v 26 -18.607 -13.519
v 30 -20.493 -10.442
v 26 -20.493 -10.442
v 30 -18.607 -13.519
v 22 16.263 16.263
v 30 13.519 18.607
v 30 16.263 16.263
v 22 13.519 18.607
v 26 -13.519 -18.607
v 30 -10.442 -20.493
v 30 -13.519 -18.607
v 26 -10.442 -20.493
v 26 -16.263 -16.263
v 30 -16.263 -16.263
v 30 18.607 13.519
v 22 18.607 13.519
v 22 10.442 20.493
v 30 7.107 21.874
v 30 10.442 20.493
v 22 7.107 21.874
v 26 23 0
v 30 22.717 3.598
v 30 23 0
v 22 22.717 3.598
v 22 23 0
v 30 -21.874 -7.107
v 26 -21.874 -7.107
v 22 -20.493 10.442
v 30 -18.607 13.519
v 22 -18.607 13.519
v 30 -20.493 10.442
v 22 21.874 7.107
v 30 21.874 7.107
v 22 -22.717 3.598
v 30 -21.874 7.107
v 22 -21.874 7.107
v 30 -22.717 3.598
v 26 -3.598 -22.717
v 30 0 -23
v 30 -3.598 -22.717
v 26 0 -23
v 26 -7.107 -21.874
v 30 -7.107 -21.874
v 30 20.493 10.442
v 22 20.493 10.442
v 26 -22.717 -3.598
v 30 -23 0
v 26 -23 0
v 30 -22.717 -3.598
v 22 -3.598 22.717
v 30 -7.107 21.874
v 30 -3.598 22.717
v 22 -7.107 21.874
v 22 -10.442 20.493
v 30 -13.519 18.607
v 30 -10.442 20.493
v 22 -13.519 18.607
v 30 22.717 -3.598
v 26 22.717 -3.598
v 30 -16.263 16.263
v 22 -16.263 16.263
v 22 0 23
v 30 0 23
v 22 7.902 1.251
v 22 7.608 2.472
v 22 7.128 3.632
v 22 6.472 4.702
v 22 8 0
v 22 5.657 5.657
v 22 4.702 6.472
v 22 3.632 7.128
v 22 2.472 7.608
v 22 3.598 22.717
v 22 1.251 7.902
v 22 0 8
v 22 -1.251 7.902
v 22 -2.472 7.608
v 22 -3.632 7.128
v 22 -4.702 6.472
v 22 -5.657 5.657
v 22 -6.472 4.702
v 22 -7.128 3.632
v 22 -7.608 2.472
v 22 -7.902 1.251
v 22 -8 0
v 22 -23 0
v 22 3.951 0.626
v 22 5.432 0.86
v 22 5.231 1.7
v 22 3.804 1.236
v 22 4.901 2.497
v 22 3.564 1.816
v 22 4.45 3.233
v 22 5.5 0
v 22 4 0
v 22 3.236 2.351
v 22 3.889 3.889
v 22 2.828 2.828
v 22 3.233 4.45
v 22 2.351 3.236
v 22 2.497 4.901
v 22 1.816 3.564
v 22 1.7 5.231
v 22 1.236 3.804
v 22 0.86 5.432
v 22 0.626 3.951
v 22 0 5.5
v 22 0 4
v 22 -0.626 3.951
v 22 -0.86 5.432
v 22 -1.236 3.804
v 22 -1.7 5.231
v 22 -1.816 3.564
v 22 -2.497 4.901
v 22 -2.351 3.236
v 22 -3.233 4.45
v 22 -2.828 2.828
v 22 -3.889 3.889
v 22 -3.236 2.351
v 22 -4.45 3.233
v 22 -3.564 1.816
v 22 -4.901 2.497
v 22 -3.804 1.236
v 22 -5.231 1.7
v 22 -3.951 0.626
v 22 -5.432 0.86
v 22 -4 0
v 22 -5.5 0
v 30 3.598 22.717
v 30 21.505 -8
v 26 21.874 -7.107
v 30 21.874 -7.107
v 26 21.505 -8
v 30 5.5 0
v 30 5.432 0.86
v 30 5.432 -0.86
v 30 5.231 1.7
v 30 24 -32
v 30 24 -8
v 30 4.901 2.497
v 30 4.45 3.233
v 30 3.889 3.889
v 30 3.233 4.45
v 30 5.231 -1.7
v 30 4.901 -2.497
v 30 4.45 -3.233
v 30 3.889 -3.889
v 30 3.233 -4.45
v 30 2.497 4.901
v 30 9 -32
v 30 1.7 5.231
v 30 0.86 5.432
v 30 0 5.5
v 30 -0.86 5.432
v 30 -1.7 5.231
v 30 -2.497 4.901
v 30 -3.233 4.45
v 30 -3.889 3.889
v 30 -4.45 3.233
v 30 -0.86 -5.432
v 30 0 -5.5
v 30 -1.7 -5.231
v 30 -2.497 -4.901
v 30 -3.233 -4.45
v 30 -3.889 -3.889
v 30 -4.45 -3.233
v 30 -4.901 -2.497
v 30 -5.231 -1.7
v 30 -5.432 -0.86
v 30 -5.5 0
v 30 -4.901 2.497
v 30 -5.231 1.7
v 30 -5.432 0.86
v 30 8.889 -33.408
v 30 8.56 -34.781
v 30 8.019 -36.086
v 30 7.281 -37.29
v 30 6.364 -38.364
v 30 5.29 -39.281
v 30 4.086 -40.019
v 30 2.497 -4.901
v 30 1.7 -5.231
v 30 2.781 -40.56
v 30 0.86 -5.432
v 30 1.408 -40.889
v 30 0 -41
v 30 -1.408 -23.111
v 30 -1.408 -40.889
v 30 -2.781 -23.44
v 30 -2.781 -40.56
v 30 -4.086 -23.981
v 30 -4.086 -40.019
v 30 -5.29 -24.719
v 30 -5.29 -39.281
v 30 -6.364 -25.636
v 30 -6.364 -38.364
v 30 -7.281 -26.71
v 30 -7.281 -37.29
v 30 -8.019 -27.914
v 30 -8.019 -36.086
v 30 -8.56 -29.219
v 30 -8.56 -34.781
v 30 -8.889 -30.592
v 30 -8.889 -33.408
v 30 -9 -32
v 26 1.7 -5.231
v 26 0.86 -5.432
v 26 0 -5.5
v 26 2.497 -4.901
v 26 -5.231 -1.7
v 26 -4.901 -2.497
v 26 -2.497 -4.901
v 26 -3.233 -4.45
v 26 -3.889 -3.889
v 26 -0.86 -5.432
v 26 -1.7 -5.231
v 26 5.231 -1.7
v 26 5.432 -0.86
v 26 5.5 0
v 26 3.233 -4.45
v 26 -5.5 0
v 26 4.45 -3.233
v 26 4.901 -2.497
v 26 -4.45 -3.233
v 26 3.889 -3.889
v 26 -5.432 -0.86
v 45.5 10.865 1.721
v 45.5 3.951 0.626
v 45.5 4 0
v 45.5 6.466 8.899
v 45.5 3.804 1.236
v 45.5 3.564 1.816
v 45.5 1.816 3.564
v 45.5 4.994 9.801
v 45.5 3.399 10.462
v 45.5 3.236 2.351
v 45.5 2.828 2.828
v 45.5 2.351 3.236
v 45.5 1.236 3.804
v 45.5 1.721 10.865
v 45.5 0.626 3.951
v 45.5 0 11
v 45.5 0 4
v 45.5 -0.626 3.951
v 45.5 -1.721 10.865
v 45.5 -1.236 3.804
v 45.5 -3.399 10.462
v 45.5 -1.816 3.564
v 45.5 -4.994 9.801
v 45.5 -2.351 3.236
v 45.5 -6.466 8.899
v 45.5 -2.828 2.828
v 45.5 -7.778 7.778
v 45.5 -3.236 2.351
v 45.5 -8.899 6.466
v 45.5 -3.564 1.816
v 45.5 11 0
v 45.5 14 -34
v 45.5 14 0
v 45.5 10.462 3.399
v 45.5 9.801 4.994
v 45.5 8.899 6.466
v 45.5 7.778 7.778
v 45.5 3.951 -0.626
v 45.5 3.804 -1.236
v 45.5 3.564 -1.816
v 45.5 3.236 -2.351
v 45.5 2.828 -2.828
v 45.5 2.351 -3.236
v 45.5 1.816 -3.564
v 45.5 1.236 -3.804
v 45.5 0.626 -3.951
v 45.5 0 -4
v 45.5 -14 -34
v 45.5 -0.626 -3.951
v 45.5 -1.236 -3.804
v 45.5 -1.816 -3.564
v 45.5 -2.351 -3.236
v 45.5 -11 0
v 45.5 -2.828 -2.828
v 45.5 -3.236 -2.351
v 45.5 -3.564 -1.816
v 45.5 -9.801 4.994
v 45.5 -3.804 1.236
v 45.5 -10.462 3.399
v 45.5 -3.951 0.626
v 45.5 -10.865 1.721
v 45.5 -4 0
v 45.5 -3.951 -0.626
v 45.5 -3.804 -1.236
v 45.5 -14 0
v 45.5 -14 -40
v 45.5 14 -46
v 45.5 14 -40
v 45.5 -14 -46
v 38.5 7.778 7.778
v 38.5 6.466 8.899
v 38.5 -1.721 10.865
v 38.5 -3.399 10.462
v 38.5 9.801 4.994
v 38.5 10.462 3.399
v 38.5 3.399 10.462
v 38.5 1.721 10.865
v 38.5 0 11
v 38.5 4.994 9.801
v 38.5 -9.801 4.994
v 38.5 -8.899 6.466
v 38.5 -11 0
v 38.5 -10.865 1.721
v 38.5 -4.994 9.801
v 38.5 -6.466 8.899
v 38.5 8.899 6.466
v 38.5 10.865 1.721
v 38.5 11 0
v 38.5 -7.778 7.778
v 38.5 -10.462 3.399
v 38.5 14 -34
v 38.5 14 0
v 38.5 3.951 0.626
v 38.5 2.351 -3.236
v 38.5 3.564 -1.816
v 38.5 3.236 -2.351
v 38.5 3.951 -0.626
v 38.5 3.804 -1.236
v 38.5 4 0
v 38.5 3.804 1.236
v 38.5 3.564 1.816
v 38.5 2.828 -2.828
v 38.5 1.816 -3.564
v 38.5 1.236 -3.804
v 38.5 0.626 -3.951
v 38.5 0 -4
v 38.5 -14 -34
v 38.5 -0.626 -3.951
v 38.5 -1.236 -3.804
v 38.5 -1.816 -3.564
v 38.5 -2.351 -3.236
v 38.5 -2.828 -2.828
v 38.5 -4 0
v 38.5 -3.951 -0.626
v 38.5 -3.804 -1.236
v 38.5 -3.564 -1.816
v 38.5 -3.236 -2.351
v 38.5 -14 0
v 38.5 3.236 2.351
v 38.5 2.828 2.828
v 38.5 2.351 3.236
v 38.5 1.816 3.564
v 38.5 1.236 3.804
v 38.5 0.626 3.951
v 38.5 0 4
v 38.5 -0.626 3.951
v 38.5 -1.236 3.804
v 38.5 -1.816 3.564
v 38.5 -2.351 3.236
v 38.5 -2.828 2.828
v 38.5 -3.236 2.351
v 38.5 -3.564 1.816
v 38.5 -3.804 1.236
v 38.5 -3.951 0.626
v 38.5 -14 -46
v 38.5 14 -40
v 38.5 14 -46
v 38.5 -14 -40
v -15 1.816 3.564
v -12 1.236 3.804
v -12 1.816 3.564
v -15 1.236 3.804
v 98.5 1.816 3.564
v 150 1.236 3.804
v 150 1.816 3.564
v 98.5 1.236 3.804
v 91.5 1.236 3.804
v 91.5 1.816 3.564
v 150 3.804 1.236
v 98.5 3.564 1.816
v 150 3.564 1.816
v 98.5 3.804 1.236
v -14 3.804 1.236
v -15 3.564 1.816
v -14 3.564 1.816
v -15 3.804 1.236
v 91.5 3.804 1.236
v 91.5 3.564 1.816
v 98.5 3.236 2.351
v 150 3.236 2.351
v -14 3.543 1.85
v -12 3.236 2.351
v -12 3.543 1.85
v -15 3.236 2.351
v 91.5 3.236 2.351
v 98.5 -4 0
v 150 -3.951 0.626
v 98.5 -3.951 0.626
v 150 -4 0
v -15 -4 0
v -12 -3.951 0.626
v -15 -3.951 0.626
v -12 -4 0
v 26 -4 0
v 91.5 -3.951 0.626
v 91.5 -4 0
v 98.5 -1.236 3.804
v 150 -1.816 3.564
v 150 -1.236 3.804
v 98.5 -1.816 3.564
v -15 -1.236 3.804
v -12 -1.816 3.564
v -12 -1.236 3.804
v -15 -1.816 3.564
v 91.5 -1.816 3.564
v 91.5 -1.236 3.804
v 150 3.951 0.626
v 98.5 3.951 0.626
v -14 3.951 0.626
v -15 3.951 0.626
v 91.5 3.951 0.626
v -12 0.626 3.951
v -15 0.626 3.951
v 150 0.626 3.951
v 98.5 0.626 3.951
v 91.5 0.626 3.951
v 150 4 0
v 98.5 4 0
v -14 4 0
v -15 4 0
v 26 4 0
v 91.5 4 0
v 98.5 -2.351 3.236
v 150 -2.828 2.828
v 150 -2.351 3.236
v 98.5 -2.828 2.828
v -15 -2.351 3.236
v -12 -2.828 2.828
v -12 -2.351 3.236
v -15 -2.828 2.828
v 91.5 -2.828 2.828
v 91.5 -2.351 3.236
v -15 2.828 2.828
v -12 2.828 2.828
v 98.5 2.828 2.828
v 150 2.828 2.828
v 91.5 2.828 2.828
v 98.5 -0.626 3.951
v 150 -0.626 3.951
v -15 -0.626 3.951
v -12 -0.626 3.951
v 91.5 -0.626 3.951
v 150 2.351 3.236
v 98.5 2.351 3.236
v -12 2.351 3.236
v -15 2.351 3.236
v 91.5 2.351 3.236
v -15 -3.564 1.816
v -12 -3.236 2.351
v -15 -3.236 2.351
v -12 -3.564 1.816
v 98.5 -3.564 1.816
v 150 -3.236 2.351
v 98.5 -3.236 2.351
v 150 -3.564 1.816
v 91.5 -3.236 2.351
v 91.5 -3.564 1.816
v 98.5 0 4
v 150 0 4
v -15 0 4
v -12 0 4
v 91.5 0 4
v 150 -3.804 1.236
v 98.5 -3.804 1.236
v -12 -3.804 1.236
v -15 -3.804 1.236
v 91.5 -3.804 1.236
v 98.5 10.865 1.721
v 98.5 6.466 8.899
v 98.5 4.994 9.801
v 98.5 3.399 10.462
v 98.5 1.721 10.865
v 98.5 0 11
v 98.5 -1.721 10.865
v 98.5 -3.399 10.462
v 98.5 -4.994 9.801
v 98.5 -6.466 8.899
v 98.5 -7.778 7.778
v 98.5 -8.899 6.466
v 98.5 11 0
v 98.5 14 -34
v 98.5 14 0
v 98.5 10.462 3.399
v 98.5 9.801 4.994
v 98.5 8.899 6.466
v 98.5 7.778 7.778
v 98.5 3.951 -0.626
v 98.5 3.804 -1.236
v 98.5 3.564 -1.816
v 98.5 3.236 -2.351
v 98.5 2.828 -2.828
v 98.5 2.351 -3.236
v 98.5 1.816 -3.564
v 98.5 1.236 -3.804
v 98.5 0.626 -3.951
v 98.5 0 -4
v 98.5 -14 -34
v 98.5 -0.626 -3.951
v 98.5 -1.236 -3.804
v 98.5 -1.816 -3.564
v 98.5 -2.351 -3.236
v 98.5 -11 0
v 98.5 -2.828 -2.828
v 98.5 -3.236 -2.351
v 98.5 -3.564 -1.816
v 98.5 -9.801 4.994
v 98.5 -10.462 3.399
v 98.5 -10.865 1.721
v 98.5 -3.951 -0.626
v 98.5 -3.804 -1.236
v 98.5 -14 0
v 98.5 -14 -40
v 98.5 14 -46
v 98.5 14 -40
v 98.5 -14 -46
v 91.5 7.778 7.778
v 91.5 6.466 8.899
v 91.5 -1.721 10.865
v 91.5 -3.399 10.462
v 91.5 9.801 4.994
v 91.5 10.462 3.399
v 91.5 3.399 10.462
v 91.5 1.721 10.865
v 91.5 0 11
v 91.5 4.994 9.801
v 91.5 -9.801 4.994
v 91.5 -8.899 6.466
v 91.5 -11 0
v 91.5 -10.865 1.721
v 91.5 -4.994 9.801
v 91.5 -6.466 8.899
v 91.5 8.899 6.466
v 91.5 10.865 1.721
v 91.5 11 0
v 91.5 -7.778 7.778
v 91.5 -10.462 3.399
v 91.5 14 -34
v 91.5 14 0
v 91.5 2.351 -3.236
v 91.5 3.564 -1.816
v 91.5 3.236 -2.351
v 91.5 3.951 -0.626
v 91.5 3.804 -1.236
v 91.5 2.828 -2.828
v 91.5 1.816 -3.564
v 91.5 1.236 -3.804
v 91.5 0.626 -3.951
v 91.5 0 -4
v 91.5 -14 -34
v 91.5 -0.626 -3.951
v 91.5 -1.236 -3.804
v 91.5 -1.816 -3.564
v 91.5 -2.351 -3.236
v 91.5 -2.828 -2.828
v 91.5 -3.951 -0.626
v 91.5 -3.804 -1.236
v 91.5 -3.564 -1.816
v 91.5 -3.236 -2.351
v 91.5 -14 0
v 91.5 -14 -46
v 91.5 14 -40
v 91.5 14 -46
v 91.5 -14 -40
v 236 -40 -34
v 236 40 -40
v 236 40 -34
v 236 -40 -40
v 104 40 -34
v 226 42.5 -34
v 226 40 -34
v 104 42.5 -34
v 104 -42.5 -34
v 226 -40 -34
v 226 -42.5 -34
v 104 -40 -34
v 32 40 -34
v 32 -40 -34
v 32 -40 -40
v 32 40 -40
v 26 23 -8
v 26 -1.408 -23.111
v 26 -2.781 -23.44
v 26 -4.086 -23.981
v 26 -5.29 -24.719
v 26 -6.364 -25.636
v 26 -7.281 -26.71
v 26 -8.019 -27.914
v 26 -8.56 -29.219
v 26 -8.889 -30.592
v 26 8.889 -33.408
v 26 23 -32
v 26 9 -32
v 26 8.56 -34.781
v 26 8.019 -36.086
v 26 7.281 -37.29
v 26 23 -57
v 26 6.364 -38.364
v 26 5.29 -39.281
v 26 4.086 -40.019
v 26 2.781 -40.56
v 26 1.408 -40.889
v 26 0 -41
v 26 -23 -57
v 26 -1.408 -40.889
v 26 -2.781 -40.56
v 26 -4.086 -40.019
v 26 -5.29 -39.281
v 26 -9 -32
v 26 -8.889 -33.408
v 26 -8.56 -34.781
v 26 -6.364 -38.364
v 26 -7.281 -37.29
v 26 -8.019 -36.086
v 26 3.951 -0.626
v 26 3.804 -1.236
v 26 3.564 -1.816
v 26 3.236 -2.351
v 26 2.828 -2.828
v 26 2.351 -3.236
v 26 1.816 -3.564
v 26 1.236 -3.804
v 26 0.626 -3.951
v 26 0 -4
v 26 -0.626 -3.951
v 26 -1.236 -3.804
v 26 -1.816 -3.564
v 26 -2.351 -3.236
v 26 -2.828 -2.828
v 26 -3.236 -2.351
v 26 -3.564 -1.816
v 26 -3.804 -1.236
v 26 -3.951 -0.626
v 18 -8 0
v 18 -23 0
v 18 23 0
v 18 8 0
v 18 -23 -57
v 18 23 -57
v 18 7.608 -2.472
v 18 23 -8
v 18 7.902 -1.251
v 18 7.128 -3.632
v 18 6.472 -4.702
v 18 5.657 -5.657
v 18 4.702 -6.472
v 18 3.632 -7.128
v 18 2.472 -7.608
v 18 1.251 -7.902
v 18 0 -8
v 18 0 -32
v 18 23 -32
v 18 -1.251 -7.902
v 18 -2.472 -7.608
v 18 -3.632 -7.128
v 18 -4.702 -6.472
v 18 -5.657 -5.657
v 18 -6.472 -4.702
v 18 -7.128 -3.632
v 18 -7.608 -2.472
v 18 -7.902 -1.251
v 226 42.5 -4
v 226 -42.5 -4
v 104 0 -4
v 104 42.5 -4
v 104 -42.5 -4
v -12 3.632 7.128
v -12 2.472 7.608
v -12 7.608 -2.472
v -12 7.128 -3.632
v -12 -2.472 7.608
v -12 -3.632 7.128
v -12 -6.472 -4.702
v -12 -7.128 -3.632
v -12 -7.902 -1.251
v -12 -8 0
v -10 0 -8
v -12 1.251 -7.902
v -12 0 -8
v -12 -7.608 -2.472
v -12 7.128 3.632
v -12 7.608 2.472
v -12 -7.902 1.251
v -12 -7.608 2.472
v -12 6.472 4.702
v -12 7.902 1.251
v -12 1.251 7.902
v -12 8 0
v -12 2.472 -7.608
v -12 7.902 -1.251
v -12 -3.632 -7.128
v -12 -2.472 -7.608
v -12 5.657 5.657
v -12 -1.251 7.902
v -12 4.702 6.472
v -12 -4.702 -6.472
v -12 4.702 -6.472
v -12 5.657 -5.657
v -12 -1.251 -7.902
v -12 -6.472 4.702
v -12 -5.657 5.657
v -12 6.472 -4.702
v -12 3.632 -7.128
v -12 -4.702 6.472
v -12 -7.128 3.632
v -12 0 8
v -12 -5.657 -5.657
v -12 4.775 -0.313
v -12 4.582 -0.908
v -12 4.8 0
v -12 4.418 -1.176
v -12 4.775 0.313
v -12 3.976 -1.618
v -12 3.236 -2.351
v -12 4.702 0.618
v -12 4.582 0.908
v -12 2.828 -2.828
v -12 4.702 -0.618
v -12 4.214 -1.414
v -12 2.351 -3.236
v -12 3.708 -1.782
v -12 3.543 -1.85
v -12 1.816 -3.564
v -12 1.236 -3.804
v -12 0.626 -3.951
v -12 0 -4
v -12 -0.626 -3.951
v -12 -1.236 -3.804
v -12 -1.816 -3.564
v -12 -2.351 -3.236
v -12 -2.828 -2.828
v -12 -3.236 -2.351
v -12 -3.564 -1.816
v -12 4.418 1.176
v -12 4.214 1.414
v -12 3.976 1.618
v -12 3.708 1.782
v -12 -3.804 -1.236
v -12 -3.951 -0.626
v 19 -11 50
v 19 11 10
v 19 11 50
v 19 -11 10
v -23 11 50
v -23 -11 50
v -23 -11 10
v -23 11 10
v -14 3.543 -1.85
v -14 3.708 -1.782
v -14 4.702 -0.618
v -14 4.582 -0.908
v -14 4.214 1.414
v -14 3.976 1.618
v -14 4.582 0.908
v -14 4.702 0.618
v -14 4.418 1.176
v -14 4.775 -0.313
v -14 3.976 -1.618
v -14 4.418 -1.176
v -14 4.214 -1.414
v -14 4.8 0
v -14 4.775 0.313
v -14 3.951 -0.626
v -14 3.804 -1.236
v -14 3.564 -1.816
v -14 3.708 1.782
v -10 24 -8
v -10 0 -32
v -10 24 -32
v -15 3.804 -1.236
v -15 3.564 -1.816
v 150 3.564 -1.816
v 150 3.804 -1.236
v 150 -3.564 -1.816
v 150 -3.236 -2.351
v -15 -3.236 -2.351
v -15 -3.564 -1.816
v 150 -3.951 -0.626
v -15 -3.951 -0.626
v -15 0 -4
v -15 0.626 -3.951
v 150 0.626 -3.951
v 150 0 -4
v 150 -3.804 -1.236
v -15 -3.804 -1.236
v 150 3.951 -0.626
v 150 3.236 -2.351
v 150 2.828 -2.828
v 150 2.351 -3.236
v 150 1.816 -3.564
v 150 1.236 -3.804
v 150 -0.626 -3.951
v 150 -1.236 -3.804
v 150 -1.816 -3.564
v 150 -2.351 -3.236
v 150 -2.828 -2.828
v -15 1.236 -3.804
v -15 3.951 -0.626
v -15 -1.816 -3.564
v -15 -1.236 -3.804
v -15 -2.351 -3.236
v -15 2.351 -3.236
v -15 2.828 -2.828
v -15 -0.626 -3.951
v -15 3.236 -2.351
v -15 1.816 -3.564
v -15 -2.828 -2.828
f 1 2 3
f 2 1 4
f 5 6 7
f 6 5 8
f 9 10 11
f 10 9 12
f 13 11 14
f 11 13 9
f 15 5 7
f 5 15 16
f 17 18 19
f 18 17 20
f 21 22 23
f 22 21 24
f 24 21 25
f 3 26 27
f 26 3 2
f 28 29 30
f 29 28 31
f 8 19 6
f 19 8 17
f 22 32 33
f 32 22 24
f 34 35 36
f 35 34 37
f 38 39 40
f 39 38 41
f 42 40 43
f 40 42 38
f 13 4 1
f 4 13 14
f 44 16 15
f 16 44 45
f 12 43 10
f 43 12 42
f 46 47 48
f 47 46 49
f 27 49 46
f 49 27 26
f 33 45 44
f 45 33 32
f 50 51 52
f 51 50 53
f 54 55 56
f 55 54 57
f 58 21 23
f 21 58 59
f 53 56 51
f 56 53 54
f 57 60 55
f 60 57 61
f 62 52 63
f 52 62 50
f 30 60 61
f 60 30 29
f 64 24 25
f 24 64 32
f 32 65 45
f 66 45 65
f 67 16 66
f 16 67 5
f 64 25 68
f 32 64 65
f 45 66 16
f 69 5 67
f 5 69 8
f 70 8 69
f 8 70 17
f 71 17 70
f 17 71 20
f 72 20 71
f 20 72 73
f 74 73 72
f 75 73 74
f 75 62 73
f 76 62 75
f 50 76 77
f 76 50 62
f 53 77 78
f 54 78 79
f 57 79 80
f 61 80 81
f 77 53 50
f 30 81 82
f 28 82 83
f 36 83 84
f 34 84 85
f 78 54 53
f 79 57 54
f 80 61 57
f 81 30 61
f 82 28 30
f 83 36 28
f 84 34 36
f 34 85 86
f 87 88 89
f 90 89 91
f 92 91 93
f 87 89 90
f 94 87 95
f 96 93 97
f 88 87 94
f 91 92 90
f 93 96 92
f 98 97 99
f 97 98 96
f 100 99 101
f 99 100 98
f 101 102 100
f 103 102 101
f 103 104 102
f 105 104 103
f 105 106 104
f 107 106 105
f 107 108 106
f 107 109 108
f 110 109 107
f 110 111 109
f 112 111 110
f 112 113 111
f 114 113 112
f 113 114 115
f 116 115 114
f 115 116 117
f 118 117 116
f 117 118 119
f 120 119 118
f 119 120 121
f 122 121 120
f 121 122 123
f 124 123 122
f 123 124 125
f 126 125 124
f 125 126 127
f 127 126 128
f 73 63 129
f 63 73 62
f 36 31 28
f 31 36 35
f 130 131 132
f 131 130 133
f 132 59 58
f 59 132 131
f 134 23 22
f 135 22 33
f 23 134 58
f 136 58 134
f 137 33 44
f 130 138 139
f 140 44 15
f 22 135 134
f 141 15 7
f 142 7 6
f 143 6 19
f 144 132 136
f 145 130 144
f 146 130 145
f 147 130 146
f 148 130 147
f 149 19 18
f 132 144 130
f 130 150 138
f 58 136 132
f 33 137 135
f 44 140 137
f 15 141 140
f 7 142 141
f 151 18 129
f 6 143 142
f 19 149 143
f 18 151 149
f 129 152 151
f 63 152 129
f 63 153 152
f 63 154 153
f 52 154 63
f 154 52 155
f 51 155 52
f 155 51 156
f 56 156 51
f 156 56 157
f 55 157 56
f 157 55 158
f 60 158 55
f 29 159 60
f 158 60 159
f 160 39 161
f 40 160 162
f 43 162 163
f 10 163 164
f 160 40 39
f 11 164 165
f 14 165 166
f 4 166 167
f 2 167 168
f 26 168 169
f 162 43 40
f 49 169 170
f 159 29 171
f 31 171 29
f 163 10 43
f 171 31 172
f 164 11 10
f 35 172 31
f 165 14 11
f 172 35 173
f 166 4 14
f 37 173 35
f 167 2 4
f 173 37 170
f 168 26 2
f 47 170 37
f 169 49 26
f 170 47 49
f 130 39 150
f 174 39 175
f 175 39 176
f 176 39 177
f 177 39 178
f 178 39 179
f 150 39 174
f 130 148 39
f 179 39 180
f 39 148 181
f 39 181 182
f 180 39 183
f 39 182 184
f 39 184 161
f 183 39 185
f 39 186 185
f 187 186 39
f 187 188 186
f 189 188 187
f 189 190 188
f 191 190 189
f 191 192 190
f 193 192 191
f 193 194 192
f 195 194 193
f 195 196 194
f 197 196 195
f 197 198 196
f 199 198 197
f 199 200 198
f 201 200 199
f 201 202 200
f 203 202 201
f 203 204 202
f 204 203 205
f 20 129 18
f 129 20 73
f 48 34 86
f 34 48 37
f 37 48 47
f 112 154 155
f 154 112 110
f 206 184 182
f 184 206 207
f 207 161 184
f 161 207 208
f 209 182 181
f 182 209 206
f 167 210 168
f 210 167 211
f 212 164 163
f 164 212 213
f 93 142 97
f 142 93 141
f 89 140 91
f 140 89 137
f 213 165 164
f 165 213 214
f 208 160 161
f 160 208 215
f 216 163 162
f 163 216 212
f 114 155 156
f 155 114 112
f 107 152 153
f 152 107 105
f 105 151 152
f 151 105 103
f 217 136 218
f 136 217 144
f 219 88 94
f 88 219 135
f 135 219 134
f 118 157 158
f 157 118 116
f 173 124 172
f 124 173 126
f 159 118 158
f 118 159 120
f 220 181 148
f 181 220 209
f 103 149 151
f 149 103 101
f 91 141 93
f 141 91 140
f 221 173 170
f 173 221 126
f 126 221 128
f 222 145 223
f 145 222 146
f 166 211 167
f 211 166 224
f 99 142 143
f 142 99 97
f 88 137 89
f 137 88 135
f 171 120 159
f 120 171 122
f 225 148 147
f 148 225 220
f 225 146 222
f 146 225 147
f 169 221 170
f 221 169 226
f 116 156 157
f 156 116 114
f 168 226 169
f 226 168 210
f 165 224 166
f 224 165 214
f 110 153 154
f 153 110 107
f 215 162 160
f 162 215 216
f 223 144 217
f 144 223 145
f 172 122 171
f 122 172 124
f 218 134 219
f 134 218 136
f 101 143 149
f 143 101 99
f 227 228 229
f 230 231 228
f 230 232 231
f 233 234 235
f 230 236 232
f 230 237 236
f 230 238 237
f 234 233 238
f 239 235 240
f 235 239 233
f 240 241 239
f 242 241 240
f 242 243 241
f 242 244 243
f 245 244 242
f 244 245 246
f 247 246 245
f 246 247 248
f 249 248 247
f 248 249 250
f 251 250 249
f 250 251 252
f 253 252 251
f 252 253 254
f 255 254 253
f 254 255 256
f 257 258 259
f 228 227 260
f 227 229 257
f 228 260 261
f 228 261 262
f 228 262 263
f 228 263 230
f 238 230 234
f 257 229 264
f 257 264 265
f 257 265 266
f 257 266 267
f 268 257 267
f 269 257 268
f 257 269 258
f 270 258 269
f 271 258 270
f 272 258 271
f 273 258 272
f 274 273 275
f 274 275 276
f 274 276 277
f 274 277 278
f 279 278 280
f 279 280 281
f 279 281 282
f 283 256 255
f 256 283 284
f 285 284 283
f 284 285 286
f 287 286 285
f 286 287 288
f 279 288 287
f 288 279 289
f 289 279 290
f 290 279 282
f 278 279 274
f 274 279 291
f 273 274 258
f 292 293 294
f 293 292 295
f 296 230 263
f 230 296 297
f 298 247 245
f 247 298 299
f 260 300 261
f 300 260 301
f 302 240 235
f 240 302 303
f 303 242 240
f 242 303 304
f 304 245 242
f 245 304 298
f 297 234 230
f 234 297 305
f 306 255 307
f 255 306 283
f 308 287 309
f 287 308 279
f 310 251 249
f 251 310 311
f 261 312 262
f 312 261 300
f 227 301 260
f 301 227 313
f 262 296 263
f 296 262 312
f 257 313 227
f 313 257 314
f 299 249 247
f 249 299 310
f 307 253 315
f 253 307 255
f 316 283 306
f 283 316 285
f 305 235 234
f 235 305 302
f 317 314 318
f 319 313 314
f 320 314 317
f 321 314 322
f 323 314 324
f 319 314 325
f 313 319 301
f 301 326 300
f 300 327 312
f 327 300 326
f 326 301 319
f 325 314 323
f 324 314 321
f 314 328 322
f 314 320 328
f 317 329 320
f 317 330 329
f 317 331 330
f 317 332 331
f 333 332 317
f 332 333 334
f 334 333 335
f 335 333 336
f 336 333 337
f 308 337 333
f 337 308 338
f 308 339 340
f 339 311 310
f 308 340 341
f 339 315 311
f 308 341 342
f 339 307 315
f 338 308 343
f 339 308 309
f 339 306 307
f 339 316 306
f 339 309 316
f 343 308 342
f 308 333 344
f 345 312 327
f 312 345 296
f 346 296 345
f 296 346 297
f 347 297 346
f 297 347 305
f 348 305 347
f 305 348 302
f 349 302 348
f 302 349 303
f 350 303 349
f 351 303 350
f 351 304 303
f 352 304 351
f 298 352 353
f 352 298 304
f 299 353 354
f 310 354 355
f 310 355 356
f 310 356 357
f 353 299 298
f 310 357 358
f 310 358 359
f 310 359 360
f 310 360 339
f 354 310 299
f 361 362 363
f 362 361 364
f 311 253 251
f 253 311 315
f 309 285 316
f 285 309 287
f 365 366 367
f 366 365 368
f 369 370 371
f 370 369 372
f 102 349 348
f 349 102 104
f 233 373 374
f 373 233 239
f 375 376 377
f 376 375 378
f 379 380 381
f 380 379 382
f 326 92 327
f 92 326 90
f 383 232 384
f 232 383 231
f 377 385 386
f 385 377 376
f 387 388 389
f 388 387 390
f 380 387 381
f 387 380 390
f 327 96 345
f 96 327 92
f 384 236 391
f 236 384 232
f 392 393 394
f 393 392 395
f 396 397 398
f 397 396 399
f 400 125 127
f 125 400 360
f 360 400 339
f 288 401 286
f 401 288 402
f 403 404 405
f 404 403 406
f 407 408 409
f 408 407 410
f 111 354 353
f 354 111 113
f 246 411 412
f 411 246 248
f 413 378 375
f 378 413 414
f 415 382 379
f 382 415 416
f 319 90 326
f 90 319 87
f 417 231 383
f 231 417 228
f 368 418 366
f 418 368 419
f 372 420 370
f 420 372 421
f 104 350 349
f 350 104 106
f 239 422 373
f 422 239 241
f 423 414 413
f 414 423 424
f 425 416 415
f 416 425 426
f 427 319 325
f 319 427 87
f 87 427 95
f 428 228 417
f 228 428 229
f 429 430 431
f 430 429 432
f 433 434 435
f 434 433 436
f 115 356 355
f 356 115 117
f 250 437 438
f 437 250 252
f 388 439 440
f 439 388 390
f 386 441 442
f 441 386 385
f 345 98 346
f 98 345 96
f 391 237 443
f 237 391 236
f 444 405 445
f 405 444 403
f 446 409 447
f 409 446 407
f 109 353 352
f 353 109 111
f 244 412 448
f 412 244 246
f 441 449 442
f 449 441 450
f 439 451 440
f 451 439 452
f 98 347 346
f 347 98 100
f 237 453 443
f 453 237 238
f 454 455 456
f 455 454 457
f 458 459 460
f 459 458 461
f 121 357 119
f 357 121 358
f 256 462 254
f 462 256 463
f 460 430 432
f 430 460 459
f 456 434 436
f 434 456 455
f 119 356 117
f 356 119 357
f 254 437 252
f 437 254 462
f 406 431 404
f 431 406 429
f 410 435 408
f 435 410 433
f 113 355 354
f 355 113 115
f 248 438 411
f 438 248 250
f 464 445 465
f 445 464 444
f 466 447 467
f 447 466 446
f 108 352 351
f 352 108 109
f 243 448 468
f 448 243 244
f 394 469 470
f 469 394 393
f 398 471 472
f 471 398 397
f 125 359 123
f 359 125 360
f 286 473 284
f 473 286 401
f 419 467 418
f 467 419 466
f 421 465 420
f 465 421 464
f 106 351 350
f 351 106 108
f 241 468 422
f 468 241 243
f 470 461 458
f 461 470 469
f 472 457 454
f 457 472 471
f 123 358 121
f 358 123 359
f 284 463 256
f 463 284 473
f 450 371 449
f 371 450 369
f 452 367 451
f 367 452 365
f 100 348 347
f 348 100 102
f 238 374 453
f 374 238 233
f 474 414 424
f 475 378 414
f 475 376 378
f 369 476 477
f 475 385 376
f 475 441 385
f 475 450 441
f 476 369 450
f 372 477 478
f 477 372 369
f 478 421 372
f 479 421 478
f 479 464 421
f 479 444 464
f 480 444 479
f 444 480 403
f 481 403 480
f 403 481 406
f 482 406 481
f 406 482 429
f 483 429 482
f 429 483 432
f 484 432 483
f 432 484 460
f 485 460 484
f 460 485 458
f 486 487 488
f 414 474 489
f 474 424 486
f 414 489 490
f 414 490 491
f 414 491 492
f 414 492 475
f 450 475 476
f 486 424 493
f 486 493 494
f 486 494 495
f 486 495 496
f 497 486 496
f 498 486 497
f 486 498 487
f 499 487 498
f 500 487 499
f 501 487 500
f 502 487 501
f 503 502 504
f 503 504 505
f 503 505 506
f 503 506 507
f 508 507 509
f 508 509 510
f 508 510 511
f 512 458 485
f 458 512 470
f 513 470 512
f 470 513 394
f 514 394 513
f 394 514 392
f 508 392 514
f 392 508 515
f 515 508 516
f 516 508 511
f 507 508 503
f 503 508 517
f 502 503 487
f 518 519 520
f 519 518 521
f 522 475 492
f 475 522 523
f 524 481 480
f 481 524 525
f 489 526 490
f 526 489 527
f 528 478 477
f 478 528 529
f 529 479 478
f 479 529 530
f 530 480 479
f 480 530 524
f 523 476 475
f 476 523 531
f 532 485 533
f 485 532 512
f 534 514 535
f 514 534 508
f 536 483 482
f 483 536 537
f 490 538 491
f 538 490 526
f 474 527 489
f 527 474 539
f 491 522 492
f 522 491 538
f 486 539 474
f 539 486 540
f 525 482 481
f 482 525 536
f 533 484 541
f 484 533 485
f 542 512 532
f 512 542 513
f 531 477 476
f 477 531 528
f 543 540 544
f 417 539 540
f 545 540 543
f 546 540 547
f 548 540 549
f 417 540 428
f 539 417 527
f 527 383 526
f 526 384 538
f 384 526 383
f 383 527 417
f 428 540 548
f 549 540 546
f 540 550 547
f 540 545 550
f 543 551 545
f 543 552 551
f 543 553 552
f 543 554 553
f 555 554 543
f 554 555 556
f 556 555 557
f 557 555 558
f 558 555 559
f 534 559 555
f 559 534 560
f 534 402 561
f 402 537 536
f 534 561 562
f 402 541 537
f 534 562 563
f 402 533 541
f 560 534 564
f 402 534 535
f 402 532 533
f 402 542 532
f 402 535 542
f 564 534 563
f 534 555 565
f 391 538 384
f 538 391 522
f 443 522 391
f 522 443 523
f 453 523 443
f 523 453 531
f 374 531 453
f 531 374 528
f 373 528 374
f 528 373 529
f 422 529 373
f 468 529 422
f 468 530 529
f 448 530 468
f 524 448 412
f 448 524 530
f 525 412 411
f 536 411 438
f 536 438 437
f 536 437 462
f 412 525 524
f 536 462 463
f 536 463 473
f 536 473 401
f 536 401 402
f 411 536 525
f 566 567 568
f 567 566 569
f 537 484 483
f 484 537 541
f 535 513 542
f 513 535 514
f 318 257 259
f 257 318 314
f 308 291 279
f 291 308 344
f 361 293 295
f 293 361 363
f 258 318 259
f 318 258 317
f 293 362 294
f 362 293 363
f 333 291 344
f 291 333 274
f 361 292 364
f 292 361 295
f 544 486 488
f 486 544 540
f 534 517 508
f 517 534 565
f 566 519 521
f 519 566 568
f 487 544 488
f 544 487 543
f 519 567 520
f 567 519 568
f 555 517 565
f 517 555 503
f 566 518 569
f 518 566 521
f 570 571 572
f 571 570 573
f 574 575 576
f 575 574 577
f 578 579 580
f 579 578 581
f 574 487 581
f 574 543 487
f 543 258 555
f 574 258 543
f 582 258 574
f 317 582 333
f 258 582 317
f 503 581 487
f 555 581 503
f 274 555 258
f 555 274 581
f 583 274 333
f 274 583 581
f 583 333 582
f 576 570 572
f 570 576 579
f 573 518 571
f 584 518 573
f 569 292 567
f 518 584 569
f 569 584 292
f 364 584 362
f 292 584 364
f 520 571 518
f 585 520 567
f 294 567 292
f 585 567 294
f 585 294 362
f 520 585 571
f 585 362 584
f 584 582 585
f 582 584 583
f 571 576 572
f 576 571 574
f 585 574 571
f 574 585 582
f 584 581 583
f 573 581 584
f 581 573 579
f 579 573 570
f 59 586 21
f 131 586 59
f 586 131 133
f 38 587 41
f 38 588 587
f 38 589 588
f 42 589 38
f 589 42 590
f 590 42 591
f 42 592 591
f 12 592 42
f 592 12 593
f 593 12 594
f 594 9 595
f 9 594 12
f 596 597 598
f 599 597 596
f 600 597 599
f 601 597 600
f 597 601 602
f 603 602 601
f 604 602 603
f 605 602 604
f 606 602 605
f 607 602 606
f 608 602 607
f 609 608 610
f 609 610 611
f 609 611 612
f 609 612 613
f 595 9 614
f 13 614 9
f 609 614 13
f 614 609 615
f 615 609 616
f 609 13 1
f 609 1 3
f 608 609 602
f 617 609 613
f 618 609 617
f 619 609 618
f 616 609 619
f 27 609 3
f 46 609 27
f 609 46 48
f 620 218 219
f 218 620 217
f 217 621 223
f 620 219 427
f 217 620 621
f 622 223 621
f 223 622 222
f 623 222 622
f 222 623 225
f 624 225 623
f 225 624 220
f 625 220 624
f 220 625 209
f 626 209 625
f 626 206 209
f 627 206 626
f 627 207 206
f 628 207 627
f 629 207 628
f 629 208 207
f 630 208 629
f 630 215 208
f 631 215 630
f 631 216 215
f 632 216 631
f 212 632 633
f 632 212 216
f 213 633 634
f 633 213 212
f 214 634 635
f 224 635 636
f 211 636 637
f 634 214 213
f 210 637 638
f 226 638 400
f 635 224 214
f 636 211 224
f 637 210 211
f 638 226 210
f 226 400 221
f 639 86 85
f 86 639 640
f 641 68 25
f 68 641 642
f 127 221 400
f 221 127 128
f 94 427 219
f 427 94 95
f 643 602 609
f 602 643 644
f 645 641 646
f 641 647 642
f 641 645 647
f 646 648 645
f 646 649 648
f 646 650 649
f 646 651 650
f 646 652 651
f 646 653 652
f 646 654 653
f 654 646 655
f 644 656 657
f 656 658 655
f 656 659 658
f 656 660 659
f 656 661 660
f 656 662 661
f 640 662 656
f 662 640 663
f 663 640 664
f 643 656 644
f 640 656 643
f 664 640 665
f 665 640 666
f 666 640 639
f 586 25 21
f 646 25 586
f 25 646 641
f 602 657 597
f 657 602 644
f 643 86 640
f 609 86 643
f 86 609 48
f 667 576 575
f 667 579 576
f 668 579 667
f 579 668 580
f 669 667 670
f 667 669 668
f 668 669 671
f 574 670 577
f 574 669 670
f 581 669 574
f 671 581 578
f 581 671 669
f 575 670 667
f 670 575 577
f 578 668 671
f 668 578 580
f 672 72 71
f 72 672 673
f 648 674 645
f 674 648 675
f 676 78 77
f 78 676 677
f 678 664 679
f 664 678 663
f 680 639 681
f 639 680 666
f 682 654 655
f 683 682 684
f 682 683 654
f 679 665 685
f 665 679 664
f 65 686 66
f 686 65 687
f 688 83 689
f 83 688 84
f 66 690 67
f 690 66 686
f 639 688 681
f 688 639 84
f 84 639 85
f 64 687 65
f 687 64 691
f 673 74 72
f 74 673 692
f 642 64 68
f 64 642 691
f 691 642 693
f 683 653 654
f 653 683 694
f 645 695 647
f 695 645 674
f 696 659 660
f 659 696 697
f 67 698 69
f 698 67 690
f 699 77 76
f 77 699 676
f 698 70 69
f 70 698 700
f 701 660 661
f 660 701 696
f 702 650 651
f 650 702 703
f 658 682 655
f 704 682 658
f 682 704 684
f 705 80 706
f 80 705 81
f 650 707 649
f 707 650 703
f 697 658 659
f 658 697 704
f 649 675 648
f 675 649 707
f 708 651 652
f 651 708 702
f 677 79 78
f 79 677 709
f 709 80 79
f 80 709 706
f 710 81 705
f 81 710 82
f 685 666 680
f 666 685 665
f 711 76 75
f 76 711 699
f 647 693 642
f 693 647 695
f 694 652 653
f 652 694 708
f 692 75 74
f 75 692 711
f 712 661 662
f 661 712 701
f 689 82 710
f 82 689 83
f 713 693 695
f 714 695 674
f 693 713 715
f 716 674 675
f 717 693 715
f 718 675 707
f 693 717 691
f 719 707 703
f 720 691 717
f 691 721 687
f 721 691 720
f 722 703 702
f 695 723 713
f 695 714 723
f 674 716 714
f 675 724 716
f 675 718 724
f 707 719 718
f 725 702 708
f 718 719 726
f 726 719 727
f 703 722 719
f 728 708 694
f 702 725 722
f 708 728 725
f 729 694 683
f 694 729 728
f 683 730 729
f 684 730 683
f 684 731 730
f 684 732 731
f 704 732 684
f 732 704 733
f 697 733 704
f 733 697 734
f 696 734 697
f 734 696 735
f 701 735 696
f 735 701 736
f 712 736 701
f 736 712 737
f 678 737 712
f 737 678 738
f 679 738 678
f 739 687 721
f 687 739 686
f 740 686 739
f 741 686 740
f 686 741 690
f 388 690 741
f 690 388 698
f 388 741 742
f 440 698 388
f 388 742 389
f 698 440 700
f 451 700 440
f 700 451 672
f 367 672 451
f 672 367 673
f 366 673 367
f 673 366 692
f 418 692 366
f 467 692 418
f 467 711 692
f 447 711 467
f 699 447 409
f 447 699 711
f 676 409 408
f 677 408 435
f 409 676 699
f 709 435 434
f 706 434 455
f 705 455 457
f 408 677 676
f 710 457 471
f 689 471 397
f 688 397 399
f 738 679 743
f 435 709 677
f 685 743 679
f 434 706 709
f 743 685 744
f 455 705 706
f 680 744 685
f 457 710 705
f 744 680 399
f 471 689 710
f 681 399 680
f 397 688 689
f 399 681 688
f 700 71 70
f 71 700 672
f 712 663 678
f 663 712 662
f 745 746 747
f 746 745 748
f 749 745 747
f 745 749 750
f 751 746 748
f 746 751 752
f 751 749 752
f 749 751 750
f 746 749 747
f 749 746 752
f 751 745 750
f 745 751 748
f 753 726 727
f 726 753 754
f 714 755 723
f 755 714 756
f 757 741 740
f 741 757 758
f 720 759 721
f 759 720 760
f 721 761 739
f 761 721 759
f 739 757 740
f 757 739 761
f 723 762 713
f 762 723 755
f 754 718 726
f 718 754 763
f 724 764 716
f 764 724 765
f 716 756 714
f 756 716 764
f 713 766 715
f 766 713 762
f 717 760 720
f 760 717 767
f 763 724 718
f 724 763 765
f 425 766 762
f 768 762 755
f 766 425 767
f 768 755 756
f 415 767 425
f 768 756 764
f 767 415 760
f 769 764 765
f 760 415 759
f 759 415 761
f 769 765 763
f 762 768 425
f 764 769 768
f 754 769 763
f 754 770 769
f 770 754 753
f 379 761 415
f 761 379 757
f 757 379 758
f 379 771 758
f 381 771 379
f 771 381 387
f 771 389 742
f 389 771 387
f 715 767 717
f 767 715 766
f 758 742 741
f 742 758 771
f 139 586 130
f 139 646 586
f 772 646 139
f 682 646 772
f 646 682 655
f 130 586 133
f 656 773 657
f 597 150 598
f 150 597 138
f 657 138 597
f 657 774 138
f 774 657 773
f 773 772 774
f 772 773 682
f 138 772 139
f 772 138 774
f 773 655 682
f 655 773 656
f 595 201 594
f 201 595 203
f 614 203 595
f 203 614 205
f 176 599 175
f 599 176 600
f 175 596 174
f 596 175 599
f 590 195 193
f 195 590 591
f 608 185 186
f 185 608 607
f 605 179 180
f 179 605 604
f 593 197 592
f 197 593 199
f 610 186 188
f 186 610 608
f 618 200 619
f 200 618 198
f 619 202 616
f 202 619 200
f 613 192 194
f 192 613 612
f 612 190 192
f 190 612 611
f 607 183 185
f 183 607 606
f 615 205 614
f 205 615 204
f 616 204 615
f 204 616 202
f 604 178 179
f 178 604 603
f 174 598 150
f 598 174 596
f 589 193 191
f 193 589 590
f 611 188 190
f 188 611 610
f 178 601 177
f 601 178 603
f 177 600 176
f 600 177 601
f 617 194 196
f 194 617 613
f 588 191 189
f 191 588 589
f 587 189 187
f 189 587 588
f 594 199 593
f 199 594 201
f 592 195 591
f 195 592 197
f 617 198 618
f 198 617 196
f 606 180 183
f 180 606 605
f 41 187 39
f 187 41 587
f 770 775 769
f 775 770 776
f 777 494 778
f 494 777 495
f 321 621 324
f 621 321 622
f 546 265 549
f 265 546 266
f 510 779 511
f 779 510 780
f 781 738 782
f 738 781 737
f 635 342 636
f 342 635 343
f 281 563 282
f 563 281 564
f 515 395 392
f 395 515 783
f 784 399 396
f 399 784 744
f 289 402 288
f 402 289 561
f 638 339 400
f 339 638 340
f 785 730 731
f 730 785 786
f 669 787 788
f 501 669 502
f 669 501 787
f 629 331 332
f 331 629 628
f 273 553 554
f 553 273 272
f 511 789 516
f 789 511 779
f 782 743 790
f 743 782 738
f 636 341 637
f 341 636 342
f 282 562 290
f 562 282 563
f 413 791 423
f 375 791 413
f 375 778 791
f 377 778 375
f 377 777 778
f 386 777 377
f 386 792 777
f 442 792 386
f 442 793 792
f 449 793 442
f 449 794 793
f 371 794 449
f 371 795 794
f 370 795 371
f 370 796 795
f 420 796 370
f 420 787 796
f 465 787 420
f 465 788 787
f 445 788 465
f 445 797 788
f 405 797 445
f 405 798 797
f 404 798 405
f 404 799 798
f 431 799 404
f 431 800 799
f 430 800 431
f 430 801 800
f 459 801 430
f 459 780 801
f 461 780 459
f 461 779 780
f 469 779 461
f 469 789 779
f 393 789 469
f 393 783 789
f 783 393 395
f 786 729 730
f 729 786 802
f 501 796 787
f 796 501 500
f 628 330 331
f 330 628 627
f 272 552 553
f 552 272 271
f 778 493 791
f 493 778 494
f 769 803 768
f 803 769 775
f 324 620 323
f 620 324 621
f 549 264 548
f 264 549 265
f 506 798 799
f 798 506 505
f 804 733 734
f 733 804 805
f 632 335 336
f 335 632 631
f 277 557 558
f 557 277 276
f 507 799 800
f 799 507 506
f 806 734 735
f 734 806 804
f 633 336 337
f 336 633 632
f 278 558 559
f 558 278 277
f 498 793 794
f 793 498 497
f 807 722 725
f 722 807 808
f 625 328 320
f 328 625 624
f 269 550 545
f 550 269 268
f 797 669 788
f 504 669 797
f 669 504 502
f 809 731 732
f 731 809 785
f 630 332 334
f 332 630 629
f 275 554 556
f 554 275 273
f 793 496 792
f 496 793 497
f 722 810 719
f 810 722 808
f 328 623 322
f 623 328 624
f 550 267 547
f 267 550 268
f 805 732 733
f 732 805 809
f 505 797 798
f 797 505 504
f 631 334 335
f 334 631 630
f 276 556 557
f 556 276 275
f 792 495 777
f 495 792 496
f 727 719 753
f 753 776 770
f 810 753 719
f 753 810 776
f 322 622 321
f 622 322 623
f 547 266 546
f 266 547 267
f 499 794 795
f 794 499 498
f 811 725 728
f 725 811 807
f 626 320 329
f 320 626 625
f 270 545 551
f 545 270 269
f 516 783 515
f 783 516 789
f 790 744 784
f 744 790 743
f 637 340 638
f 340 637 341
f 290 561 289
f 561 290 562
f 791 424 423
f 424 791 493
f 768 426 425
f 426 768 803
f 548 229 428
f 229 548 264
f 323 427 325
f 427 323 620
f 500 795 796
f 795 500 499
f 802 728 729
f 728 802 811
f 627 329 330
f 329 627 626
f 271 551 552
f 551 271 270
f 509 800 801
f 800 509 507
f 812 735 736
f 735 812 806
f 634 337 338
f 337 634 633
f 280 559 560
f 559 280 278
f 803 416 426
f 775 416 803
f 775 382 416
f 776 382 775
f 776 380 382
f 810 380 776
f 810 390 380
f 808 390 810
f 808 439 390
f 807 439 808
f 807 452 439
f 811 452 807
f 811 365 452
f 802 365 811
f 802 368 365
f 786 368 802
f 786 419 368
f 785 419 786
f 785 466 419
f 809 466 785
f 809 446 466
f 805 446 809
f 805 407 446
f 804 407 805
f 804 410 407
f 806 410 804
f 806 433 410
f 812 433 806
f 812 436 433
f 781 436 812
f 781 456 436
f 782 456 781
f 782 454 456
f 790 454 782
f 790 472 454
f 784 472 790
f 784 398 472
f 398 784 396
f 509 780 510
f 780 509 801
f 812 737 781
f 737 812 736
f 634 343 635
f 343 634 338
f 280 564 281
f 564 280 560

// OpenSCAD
// massing.scad — ROUGH massing of the rotating-head architecture (blocks only)
// Goal: eyeball proportions, motor swing clearance, and balance before detailing.
//
//   Rotation axis = X = the wire axis. The HEAD rotates about X (Axis 2). On the
//   head: the bender drivetrain (tiny stepper + servo gearbox -> layshaft -> mandrel)
//   on one side, and the ROTATION motor on the opposite side (counterweight + drive).
//   The rotation motor's pinion meshes a FIXED gear printed into the base; the feed
//   tube spins passively in 2 base bearings. Both motors hang off the FRONT so they
//   clear the base when the head swings.
//
//   front (head) ── -X            +X ── (feeder)
//
// rot = head rotation angle (deg) to check swing clearance.

$fn = 40;
rot = 0;

// ── wire / feed tube ────────────────────────────────────────────────
TUBE_D = 8;  TUBE_X = [-15, 150];

// ── base (fixed) ────────────────────────────────────────────────────
FIXED_GEAR_X = 30;  FIXED_GEAR_D = 46;  FIXED_GEAR_W = 8;   // printed into base
BRG_X = [42, 95];   BRG_OD = 22;  BRG_W = 7;                // 2 passive bearings
FEEDER_X = 165;     FEEDER = [122, 85, 30];                 // flat on base (from before)
BASE_W = 80;  BASE_TH = 6;  BASE_TOP_Z = -34;               // wire axis ~34mm above base
BASE_X0 = FIXED_GEAR_X + 2;                                 // front edge: head cantilevers clear of this
BASE_X1 = FEEDER_X + FEEDER[0]/2 + 10;
SWING_R = 54;                                               // head swing envelope radius
HEAD_X = [-25, FIXED_GEAR_X];                              // head extent along X (forward of base)

// ── rotating head (everything here turns about X) ───────────────────
// bender drivetrain: gutted servo (gearbox) + tiny stepper, on +R side
BENDER = [42, 22, 40];          // rough servo-ish body L(x) x W x H
BENDER_R = 30;                  // radius of its CoM from the wire axis
MANDREL_OFFSET = 2.8;           // wire tangent to the mandrel
MANDREL_D = 4;

// rotation motor: axis ∥ X, pinion at FIXED_GEAR_X meshes the fixed gear
ROTMOT = [40, 24, 24];          // rough geared-stepper body L(x) x W x H
ROT_PINION_D = 18;
ROT_R = FIXED_GEAR_D/2 + ROT_PINION_D/2;                // mesh offset from axis (~32)

module tube() color([0.6,0.62,0.66])
    translate([TUBE_X[0],0,0]) rotate([0,90,0]) cylinder(d=TUBE_D, h=TUBE_X[1]-TUBE_X[0]);

module base() {
    // base plate — front edge at BASE_X0, behind the head's swing
    color([0.30,0.32,0.36])
        translate([(BASE_X0+BASE_X1)/2, 0, BASE_TOP_Z - BASE_TH/2])
            cube([BASE_X1-BASE_X0, BASE_W, BASE_TH], center=true);
    // fixed gear printed into the base (ring, bore for the tube)
    color([0.20,0.55,0.85])
        translate([FIXED_GEAR_X - FIXED_GEAR_W, 0, 0]) rotate([0,90,0])
            difference(){ cylinder(d=FIXED_GEAR_D, h=FIXED_GEAR_W); translate([0,0,-1]) cylinder(d=TUBE_D+3, h=FIXED_GEAR_W+2); }
    // a wall tying the fixed gear down to the base
    color([0.30,0.32,0.36])
        translate([FIXED_GEAR_X-FIXED_GEAR_W, 0, (BASE_TOP_Z + (-FIXED_GEAR_D/2))/2])
            cube([FIXED_GEAR_W, FIXED_GEAR_D, abs(BASE_TOP_Z)+FIXED_GEAR_D/2], center=true);
    // 2 passive bearings (uprights)
    for (x=BRG_X) {
        color([0.66,0.68,0.72])
            translate([x-BRG_W/2,0,0]) rotate([0,90,0]) difference(){ cylinder(d=BRG_OD,h=BRG_W); translate([0,0,-1]) cylinder(d=TUBE_D,h=BRG_W+2); }
        color([0.66,0.68,0.72])
            translate([x,0,(BASE_TOP_Z-12)/2]) cube([BRG_W,BRG_OD+6,abs(BASE_TOP_Z)+12],center=true);
    }
    // feeder block (flat on base)
    color([0.18,0.19,0.22])
        translate([FEEDER_X,0,BASE_TOP_Z+FEEDER[2]/2]) cube([FEEDER[0],FEEDER[1],FEEDER[2]],center=true);
}

module head() rotate([rot,0,0]) {           // rotates about X (wire axis)
    // central hub on the tube
    color([0.85,0.55,0.2]) translate([-12,0,0]) rotate([0,90,0]) cylinder(d=16,h=34);
    // bender drivetrain on +R
    color([0.30,0.55,0.85])
        translate([-2, 0, BENDER_R]) cube([BENDER[0],BENDER[1],BENDER[2]],center=true);
    // mandrel (near the wire axis, offset tangent)
    color([0.62,0.64,0.68])
        translate([-14, MANDREL_OFFSET, 0]) rotate([0,90,0]) cylinder(d=MANDREL_D,h=10);
    // rotation motor opposite (-R), axis ∥ X, pinion meshes the fixed gear
    color([0.25,0.27,0.30])
        translate([FIXED_GEAR_X-ROTMOT[0], 0, -ROT_R]) cube([ROTMOT[0],ROTMOT[1],ROTMOT[2]],center=false);
    color([0.85,0.55,0.2])
        translate([FIXED_GEAR_X-FIXED_GEAR_W, 0, -ROT_R]) rotate([0,90,0]) cylinder(d=ROT_PINION_D,h=FIXED_GEAR_W);
}

tube();
base();
head();

// head swing envelope (forward of the base, in open air) — translucent
%color([1, 0.4, 0.4, 0.18])
    translate([HEAD_X[0], 0, 0]) rotate([0, 90, 0]) cylinder(r = SWING_R, h = HEAD_X[1]-HEAD_X[0]);
